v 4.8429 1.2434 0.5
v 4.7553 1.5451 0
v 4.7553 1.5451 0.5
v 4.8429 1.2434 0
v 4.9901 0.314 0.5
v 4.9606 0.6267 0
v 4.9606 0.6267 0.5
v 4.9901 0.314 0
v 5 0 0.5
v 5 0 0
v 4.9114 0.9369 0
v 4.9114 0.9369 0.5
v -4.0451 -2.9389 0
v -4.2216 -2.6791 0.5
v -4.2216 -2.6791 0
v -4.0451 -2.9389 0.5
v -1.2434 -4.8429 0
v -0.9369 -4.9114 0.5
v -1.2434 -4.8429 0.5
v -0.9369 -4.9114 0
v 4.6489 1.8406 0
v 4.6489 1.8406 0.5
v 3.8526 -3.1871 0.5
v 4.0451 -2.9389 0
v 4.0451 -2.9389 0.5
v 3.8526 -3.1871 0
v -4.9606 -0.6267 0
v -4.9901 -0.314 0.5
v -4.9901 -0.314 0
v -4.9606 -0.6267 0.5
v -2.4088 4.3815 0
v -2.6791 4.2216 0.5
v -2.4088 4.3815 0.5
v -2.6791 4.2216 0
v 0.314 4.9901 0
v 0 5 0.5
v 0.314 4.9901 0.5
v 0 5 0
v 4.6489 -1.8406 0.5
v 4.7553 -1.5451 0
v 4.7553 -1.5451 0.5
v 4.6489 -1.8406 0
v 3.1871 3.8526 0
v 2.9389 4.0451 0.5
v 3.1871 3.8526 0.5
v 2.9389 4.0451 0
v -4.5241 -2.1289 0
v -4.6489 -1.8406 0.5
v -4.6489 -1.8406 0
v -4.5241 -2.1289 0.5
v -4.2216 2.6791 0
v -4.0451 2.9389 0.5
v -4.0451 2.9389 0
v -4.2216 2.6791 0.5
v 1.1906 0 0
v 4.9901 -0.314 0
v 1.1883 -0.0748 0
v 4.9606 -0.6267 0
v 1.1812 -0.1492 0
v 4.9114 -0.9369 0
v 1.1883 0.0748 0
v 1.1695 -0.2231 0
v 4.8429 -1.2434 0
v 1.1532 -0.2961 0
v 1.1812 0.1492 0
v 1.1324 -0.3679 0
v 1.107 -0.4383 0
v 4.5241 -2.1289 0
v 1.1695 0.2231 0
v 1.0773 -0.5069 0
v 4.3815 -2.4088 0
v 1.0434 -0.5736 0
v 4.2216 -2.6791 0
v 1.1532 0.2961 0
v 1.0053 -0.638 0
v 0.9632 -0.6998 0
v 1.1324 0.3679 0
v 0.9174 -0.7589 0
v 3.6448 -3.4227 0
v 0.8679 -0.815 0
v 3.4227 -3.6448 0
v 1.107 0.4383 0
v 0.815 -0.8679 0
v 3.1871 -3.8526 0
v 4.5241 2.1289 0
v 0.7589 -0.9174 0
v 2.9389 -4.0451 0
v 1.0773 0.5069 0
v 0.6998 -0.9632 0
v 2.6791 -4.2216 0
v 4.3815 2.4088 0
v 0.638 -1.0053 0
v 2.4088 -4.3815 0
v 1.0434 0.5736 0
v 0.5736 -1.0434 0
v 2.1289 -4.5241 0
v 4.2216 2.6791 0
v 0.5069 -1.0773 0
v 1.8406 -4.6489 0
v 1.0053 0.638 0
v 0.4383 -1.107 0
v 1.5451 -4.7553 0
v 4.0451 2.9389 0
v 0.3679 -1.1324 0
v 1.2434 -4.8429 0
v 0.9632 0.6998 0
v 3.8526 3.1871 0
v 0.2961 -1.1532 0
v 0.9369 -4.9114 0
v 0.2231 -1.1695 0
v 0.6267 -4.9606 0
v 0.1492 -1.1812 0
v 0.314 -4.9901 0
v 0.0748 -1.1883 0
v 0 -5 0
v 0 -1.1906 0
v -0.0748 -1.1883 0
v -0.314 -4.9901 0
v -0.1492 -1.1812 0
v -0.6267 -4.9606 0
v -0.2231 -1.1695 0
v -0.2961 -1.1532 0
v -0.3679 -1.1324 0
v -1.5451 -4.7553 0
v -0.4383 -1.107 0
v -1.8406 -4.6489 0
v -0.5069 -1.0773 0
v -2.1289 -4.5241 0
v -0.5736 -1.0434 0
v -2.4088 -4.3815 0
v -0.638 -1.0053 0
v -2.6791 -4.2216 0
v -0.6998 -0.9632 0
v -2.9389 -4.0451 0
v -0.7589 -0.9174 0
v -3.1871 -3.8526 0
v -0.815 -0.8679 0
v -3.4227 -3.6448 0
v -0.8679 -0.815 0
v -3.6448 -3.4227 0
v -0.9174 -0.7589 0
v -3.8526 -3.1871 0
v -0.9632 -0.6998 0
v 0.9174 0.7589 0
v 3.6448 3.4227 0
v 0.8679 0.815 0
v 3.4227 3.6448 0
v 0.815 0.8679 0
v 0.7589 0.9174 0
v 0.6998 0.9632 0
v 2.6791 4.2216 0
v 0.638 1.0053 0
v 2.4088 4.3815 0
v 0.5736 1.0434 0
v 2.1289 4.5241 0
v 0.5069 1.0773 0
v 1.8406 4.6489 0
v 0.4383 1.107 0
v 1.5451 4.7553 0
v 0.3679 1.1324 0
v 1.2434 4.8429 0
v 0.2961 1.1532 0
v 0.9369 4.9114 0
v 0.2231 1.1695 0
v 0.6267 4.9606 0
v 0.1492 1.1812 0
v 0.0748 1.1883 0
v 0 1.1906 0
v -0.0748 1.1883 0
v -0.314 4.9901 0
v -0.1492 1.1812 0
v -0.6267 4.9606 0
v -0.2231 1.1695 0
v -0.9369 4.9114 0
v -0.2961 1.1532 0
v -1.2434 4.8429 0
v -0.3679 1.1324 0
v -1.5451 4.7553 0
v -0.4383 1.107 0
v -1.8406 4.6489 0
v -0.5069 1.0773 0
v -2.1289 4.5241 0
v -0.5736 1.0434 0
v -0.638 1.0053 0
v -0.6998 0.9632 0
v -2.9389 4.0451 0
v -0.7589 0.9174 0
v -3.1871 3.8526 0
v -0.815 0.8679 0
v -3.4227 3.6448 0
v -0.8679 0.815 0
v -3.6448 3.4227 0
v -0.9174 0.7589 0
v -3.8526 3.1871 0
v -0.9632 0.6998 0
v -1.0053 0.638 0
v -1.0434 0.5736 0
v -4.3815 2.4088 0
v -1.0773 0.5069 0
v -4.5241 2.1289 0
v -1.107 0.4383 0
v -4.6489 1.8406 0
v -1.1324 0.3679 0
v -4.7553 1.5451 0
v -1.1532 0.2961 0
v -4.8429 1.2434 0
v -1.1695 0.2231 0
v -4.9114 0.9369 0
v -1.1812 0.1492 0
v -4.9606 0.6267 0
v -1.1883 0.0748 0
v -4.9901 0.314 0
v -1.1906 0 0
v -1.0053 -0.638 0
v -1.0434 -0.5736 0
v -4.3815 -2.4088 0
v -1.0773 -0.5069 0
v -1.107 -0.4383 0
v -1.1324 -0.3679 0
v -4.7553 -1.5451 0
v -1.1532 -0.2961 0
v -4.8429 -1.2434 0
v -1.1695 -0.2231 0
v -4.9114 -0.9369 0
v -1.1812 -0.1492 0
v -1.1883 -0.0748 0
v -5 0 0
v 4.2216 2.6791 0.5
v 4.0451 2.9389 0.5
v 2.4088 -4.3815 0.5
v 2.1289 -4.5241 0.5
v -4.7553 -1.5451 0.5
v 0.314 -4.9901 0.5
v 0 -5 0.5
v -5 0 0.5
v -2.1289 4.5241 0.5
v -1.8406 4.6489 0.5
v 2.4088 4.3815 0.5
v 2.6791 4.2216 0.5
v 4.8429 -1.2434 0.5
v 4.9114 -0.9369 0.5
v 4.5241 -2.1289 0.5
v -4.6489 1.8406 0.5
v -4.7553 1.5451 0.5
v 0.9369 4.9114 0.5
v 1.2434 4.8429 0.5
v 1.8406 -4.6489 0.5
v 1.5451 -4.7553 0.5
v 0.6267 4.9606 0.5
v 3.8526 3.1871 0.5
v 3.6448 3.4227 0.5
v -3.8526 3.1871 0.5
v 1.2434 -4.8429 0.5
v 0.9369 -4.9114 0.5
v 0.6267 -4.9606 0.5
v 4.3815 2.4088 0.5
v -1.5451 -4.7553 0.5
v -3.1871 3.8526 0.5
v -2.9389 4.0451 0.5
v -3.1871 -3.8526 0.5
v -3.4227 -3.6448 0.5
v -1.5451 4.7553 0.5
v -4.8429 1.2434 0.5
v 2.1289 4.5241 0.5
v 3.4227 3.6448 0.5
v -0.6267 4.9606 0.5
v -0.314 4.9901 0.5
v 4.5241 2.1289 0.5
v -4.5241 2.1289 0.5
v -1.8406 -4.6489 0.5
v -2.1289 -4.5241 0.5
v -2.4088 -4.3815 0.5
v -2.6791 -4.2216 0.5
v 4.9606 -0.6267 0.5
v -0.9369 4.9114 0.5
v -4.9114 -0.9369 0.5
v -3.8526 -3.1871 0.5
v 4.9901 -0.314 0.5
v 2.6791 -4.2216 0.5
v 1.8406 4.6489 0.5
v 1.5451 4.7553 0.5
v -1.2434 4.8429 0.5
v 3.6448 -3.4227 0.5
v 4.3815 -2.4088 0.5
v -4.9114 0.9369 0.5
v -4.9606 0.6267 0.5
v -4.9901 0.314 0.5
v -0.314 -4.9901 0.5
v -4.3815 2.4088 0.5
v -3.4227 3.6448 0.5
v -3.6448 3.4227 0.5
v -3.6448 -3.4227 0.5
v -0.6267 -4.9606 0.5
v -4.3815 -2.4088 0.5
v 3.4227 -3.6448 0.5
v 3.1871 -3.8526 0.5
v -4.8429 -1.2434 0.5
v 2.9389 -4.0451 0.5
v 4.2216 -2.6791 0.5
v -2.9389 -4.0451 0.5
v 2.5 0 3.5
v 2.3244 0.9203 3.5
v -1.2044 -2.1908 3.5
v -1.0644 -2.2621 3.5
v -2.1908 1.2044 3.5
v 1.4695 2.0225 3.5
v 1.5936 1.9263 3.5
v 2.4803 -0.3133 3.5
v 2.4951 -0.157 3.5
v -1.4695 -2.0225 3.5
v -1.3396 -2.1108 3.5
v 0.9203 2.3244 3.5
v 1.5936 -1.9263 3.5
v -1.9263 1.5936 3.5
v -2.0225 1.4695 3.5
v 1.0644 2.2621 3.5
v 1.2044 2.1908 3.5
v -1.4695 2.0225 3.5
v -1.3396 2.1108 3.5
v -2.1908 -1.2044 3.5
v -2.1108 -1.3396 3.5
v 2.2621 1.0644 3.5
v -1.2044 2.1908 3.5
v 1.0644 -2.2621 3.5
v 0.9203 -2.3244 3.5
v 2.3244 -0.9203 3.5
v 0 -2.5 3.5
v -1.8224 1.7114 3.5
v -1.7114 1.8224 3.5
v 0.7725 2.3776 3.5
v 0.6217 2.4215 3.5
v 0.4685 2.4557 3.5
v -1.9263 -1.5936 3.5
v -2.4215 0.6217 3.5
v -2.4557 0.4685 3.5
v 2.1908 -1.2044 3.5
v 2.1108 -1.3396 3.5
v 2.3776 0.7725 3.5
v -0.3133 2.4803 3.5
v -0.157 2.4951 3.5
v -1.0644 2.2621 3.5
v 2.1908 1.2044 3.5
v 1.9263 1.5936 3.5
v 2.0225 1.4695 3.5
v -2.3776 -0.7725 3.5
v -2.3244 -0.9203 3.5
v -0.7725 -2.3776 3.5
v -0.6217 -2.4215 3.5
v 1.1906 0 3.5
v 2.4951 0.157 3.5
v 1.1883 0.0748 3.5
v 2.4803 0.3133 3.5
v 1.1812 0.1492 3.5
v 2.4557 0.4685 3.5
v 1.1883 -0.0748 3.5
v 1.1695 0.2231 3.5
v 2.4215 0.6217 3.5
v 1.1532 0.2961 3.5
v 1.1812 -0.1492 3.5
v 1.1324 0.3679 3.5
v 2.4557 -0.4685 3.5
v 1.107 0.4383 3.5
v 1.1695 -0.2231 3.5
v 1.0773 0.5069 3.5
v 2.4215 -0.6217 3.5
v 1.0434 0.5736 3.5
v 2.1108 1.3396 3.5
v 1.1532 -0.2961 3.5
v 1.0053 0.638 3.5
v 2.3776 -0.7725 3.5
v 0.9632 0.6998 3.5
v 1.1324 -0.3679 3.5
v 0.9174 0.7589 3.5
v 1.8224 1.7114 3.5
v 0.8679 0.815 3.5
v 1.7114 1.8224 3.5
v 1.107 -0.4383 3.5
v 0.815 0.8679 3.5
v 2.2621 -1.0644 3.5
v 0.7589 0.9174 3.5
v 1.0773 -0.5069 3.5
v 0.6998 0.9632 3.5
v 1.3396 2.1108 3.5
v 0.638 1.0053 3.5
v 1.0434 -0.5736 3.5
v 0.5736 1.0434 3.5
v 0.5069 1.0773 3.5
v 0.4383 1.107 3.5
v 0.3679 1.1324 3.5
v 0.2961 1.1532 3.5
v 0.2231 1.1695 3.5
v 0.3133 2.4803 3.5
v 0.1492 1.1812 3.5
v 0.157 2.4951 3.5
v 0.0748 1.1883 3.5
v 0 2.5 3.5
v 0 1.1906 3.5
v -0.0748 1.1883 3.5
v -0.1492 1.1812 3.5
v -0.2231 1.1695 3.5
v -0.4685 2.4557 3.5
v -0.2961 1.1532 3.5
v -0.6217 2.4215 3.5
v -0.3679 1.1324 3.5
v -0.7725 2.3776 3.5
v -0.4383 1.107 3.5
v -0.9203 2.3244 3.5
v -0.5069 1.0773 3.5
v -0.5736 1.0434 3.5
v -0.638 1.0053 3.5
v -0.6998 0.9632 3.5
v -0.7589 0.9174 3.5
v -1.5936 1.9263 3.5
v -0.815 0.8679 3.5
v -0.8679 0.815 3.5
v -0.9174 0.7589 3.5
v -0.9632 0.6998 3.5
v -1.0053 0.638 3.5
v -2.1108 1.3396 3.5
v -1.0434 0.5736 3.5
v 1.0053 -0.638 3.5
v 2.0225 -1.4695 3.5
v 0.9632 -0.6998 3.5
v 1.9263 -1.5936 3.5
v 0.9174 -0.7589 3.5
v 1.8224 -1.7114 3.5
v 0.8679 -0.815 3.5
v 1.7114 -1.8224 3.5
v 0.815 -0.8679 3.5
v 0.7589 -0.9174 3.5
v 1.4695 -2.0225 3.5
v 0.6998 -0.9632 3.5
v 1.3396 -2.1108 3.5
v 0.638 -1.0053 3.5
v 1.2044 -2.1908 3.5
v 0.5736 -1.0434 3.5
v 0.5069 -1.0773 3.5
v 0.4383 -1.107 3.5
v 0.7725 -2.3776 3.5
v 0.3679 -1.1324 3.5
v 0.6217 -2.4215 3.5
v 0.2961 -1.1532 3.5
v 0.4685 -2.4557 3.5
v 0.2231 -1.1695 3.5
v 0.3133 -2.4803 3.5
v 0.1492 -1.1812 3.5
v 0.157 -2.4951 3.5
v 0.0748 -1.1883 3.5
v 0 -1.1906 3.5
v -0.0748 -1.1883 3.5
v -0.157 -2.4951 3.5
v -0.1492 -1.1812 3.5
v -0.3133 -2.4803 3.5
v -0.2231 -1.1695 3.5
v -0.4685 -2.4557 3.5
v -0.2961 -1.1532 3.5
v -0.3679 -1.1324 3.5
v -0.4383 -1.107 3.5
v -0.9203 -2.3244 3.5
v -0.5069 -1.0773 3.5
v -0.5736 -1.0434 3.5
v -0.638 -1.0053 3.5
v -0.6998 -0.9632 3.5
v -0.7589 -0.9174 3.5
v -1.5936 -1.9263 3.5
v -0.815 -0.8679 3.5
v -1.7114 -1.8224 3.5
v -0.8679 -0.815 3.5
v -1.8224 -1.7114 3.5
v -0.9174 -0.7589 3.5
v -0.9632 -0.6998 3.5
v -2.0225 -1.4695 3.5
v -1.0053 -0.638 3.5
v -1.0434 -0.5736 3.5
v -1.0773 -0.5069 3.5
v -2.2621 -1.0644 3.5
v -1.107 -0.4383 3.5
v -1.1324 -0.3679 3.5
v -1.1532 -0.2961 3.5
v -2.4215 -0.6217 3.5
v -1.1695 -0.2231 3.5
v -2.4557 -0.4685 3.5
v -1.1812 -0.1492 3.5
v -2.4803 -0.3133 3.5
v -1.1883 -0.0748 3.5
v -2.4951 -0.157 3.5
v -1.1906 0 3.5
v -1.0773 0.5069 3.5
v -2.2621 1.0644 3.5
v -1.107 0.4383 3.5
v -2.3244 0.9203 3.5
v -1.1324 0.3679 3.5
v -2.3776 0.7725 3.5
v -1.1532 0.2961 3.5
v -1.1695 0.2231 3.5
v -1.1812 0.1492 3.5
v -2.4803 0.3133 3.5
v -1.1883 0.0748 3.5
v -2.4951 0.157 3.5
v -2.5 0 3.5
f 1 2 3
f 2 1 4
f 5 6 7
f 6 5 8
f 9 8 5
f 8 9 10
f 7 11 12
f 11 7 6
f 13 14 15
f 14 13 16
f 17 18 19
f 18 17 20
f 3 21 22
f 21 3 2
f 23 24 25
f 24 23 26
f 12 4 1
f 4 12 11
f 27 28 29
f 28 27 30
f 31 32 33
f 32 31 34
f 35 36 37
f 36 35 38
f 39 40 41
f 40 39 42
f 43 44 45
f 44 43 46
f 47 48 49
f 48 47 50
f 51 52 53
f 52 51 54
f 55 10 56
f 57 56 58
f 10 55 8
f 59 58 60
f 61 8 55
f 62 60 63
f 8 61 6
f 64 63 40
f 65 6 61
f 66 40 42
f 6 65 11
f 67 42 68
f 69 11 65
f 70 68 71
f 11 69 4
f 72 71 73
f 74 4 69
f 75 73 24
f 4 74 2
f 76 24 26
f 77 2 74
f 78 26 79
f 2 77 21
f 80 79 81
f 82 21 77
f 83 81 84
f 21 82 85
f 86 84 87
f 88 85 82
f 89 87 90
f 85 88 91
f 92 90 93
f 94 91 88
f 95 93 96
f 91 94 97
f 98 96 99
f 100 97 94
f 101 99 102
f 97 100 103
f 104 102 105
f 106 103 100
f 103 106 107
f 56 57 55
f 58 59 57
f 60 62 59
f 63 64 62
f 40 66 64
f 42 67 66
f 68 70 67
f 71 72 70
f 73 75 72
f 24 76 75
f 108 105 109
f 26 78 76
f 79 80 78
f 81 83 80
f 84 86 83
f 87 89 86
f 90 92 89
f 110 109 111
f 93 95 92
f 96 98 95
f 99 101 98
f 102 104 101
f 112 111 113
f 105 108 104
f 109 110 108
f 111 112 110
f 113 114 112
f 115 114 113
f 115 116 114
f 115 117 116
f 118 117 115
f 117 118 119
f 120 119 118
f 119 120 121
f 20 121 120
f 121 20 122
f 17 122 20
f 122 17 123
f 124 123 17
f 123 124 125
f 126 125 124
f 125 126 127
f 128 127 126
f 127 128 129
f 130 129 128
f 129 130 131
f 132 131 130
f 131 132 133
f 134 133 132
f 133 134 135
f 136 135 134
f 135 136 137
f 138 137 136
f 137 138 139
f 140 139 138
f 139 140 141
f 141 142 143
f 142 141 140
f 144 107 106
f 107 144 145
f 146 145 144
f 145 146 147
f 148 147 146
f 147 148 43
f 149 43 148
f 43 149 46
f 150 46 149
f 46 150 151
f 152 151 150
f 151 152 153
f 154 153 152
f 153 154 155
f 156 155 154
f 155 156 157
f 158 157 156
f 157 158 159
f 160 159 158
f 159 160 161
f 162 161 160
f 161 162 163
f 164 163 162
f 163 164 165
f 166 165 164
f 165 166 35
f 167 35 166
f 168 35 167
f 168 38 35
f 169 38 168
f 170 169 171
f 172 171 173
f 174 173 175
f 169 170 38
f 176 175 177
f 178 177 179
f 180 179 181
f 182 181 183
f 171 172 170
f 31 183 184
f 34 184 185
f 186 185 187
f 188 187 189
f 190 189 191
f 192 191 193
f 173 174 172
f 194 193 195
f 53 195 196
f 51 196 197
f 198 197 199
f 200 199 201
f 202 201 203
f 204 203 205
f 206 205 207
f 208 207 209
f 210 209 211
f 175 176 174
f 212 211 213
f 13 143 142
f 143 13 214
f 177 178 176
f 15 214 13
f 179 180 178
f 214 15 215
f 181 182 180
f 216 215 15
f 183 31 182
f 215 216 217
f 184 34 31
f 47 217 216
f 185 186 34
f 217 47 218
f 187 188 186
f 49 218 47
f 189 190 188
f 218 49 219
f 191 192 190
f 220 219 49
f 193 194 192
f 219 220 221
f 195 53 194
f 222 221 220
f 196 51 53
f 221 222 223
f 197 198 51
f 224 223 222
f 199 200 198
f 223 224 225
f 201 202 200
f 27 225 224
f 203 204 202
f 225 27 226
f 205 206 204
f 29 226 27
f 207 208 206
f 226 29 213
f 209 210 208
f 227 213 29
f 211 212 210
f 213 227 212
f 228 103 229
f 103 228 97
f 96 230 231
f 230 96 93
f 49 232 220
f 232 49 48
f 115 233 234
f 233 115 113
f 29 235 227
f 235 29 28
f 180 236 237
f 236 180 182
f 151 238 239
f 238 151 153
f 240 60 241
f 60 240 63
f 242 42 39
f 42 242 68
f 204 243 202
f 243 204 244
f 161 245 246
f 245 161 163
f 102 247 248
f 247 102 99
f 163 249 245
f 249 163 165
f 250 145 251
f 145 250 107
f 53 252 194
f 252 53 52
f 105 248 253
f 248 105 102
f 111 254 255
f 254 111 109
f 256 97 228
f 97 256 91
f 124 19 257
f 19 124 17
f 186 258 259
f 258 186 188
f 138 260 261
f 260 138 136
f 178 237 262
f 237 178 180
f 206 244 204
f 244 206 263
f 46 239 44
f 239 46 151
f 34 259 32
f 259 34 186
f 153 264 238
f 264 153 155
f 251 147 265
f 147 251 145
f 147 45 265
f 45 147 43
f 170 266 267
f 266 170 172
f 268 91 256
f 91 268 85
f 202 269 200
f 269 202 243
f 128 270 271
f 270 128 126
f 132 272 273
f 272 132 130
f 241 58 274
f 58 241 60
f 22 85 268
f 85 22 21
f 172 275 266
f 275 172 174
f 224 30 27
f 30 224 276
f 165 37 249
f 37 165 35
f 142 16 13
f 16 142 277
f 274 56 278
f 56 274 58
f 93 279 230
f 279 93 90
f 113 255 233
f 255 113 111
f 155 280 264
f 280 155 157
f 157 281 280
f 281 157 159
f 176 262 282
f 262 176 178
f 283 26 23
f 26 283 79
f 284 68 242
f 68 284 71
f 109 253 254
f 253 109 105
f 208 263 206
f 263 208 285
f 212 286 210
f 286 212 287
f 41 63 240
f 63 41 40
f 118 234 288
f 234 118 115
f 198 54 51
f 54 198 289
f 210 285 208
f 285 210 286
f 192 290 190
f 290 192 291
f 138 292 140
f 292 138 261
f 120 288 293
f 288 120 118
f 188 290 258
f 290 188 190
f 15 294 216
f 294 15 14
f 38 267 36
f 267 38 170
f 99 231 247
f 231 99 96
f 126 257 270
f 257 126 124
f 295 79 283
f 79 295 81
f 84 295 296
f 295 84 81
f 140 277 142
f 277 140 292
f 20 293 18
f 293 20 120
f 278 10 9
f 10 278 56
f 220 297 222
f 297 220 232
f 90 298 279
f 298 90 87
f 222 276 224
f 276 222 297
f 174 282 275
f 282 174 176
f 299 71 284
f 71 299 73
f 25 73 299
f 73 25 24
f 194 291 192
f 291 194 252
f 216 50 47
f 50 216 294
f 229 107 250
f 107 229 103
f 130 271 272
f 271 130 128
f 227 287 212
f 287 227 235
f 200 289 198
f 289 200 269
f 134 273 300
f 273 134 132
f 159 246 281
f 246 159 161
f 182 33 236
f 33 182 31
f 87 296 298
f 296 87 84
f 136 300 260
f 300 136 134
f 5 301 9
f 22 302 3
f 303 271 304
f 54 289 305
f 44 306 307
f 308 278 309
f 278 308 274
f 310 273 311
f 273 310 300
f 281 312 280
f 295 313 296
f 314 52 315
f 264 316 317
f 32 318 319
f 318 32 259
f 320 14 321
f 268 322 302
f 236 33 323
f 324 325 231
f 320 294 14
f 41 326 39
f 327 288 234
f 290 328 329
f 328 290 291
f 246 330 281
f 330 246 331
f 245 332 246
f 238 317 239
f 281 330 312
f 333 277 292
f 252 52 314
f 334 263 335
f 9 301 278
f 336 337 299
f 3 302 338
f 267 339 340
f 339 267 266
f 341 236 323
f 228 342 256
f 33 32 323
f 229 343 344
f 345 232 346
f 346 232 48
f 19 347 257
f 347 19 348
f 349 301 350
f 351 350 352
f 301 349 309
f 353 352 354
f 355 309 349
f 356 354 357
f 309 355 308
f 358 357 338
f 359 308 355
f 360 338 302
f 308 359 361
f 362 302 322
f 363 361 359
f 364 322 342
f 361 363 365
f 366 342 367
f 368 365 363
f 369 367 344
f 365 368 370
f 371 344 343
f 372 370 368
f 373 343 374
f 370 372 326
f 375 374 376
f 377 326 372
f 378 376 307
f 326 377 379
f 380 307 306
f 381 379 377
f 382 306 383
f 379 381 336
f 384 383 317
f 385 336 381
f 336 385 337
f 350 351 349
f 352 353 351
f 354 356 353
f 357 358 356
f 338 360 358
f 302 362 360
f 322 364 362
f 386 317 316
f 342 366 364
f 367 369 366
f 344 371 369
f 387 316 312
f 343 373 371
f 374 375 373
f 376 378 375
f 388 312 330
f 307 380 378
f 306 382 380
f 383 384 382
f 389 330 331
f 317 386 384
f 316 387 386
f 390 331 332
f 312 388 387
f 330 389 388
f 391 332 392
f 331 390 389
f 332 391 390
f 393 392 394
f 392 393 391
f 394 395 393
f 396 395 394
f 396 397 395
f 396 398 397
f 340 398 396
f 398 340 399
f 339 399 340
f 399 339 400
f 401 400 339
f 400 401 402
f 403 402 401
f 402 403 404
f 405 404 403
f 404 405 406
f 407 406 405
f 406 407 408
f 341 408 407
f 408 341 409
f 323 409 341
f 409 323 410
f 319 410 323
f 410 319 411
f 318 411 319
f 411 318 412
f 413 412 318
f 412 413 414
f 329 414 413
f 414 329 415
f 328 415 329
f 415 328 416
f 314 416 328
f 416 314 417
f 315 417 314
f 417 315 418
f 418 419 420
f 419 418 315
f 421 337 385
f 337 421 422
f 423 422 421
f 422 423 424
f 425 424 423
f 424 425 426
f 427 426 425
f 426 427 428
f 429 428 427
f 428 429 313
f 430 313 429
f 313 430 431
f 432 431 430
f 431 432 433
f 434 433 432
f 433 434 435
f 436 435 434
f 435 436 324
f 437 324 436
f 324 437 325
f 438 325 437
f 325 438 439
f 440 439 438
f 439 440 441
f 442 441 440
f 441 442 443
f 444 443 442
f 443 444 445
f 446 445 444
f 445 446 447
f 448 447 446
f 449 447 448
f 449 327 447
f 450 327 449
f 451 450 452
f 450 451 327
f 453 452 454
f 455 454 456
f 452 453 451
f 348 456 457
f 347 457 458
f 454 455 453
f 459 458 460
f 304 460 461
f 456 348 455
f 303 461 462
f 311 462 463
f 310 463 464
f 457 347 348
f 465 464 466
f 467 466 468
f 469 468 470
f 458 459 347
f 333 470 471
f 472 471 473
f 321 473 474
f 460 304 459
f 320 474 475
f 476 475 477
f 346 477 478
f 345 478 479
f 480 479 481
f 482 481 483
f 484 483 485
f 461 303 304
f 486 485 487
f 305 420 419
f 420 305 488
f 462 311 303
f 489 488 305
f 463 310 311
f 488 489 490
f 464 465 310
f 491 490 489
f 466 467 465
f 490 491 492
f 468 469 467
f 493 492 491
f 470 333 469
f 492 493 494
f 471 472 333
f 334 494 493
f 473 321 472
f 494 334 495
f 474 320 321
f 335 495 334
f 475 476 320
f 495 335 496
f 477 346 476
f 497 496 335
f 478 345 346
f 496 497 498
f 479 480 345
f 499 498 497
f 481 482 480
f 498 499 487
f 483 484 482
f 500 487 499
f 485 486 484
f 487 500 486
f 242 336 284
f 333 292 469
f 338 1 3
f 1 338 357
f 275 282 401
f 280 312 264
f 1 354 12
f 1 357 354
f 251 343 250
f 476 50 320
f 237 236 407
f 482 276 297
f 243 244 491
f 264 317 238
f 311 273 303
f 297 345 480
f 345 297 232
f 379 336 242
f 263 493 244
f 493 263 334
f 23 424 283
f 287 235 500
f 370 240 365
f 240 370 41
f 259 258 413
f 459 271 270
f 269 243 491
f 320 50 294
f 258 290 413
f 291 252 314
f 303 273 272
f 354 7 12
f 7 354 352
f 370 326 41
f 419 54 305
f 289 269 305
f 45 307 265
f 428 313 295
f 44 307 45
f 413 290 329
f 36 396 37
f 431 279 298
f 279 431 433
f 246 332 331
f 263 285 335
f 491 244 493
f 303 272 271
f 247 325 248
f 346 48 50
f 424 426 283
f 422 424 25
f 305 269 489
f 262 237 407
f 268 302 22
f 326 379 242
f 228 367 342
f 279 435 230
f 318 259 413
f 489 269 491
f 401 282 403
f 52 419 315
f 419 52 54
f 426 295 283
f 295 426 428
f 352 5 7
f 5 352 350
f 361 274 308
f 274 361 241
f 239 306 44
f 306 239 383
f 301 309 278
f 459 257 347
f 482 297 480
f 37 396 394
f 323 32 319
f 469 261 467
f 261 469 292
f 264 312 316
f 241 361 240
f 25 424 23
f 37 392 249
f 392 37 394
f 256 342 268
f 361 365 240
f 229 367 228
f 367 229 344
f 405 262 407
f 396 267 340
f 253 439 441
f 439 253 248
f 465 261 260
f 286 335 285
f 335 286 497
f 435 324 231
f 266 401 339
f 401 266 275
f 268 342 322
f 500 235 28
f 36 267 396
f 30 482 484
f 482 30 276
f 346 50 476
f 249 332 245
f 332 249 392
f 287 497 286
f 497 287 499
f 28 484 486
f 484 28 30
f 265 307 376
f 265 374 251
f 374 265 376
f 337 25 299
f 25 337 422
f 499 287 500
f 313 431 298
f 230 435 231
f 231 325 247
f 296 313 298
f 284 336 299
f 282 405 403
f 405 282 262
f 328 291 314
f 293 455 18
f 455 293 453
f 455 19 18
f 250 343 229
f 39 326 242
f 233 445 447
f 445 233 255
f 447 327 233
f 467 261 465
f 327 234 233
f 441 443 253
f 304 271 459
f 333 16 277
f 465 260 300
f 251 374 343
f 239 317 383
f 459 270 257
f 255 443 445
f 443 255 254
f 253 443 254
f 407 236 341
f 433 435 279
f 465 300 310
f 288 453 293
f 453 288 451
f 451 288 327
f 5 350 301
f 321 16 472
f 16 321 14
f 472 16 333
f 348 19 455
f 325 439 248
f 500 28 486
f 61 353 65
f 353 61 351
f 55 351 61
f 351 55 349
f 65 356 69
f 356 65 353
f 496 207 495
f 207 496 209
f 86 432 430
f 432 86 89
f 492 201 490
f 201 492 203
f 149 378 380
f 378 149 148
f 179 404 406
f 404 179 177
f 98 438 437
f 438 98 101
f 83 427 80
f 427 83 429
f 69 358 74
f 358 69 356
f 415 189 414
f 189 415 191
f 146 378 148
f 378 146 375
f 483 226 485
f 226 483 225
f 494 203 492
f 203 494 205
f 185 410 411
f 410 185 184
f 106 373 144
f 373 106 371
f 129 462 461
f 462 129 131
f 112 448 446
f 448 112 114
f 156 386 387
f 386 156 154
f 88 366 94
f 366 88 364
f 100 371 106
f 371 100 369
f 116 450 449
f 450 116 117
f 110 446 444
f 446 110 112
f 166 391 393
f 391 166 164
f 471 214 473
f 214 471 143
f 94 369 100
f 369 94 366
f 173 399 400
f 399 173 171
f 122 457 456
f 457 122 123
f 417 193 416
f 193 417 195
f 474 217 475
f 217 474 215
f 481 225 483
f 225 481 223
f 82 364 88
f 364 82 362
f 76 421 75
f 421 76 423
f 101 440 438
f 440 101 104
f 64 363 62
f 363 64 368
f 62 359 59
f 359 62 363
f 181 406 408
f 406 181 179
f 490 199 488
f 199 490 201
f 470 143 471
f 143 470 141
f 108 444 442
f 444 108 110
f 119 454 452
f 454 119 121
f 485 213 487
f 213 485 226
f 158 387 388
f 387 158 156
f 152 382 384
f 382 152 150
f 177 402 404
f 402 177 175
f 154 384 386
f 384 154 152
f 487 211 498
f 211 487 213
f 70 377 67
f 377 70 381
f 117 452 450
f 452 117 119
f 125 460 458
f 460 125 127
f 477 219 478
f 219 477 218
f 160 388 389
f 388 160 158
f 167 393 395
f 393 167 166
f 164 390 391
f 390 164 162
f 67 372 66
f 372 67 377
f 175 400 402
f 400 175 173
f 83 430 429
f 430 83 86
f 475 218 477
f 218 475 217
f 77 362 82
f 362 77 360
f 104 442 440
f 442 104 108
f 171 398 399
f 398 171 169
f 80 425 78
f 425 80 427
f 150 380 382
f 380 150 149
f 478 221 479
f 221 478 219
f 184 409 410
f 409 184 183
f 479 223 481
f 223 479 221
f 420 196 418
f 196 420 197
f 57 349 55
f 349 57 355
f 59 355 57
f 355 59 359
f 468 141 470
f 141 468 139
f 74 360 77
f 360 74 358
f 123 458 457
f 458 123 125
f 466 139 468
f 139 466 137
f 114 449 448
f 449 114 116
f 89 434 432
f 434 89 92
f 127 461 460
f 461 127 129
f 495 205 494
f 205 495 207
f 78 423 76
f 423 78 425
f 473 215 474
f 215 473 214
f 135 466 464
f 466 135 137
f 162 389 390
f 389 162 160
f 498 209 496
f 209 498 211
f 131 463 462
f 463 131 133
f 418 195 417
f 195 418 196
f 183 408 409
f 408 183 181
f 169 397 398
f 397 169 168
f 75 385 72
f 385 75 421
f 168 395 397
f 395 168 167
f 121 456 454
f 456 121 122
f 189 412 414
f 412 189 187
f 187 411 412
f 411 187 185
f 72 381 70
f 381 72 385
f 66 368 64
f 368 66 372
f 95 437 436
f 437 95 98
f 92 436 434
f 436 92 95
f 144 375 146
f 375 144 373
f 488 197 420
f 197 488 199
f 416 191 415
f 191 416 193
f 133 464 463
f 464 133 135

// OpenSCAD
module import_book_charkha_file(name) {
    import(str("Book_Charkha_centered", "/", name));
}
function inch_to_mm(inches) = inches * 25.4;

//import_book_charkha_file("Spindle_Pulley.stl");

height = 6;
outer_radius = 5;

module basic_shape() {
    cylinder(h = height * 0.5, r1 = outer_radius, r2=0.5 * outer_radius, $fn=100);
//translate([0, 0, height * 0.5]) cylinder(h = height * 0.5, r1 = 0.5 * outer_radius, r2=outer_radius, $fn=100);
}


module improved_shape() {
    diff = 0.5;
    cylinder(h=diff, r=outer_radius, $fn=100);
    translate([0, 0, diff]) 
        basic_shape();
  
//    translate([0, 0, diff + height]) cylinder(h=diff, r = outer_radius, $fn=100);
}

module half_shape_with_hole() {
    difference() {
    improved_shape();
    cylinder(h=height + 2, d=inch_to_mm(3/32), $fn=100);
}
}


half_shape_with_hole();
